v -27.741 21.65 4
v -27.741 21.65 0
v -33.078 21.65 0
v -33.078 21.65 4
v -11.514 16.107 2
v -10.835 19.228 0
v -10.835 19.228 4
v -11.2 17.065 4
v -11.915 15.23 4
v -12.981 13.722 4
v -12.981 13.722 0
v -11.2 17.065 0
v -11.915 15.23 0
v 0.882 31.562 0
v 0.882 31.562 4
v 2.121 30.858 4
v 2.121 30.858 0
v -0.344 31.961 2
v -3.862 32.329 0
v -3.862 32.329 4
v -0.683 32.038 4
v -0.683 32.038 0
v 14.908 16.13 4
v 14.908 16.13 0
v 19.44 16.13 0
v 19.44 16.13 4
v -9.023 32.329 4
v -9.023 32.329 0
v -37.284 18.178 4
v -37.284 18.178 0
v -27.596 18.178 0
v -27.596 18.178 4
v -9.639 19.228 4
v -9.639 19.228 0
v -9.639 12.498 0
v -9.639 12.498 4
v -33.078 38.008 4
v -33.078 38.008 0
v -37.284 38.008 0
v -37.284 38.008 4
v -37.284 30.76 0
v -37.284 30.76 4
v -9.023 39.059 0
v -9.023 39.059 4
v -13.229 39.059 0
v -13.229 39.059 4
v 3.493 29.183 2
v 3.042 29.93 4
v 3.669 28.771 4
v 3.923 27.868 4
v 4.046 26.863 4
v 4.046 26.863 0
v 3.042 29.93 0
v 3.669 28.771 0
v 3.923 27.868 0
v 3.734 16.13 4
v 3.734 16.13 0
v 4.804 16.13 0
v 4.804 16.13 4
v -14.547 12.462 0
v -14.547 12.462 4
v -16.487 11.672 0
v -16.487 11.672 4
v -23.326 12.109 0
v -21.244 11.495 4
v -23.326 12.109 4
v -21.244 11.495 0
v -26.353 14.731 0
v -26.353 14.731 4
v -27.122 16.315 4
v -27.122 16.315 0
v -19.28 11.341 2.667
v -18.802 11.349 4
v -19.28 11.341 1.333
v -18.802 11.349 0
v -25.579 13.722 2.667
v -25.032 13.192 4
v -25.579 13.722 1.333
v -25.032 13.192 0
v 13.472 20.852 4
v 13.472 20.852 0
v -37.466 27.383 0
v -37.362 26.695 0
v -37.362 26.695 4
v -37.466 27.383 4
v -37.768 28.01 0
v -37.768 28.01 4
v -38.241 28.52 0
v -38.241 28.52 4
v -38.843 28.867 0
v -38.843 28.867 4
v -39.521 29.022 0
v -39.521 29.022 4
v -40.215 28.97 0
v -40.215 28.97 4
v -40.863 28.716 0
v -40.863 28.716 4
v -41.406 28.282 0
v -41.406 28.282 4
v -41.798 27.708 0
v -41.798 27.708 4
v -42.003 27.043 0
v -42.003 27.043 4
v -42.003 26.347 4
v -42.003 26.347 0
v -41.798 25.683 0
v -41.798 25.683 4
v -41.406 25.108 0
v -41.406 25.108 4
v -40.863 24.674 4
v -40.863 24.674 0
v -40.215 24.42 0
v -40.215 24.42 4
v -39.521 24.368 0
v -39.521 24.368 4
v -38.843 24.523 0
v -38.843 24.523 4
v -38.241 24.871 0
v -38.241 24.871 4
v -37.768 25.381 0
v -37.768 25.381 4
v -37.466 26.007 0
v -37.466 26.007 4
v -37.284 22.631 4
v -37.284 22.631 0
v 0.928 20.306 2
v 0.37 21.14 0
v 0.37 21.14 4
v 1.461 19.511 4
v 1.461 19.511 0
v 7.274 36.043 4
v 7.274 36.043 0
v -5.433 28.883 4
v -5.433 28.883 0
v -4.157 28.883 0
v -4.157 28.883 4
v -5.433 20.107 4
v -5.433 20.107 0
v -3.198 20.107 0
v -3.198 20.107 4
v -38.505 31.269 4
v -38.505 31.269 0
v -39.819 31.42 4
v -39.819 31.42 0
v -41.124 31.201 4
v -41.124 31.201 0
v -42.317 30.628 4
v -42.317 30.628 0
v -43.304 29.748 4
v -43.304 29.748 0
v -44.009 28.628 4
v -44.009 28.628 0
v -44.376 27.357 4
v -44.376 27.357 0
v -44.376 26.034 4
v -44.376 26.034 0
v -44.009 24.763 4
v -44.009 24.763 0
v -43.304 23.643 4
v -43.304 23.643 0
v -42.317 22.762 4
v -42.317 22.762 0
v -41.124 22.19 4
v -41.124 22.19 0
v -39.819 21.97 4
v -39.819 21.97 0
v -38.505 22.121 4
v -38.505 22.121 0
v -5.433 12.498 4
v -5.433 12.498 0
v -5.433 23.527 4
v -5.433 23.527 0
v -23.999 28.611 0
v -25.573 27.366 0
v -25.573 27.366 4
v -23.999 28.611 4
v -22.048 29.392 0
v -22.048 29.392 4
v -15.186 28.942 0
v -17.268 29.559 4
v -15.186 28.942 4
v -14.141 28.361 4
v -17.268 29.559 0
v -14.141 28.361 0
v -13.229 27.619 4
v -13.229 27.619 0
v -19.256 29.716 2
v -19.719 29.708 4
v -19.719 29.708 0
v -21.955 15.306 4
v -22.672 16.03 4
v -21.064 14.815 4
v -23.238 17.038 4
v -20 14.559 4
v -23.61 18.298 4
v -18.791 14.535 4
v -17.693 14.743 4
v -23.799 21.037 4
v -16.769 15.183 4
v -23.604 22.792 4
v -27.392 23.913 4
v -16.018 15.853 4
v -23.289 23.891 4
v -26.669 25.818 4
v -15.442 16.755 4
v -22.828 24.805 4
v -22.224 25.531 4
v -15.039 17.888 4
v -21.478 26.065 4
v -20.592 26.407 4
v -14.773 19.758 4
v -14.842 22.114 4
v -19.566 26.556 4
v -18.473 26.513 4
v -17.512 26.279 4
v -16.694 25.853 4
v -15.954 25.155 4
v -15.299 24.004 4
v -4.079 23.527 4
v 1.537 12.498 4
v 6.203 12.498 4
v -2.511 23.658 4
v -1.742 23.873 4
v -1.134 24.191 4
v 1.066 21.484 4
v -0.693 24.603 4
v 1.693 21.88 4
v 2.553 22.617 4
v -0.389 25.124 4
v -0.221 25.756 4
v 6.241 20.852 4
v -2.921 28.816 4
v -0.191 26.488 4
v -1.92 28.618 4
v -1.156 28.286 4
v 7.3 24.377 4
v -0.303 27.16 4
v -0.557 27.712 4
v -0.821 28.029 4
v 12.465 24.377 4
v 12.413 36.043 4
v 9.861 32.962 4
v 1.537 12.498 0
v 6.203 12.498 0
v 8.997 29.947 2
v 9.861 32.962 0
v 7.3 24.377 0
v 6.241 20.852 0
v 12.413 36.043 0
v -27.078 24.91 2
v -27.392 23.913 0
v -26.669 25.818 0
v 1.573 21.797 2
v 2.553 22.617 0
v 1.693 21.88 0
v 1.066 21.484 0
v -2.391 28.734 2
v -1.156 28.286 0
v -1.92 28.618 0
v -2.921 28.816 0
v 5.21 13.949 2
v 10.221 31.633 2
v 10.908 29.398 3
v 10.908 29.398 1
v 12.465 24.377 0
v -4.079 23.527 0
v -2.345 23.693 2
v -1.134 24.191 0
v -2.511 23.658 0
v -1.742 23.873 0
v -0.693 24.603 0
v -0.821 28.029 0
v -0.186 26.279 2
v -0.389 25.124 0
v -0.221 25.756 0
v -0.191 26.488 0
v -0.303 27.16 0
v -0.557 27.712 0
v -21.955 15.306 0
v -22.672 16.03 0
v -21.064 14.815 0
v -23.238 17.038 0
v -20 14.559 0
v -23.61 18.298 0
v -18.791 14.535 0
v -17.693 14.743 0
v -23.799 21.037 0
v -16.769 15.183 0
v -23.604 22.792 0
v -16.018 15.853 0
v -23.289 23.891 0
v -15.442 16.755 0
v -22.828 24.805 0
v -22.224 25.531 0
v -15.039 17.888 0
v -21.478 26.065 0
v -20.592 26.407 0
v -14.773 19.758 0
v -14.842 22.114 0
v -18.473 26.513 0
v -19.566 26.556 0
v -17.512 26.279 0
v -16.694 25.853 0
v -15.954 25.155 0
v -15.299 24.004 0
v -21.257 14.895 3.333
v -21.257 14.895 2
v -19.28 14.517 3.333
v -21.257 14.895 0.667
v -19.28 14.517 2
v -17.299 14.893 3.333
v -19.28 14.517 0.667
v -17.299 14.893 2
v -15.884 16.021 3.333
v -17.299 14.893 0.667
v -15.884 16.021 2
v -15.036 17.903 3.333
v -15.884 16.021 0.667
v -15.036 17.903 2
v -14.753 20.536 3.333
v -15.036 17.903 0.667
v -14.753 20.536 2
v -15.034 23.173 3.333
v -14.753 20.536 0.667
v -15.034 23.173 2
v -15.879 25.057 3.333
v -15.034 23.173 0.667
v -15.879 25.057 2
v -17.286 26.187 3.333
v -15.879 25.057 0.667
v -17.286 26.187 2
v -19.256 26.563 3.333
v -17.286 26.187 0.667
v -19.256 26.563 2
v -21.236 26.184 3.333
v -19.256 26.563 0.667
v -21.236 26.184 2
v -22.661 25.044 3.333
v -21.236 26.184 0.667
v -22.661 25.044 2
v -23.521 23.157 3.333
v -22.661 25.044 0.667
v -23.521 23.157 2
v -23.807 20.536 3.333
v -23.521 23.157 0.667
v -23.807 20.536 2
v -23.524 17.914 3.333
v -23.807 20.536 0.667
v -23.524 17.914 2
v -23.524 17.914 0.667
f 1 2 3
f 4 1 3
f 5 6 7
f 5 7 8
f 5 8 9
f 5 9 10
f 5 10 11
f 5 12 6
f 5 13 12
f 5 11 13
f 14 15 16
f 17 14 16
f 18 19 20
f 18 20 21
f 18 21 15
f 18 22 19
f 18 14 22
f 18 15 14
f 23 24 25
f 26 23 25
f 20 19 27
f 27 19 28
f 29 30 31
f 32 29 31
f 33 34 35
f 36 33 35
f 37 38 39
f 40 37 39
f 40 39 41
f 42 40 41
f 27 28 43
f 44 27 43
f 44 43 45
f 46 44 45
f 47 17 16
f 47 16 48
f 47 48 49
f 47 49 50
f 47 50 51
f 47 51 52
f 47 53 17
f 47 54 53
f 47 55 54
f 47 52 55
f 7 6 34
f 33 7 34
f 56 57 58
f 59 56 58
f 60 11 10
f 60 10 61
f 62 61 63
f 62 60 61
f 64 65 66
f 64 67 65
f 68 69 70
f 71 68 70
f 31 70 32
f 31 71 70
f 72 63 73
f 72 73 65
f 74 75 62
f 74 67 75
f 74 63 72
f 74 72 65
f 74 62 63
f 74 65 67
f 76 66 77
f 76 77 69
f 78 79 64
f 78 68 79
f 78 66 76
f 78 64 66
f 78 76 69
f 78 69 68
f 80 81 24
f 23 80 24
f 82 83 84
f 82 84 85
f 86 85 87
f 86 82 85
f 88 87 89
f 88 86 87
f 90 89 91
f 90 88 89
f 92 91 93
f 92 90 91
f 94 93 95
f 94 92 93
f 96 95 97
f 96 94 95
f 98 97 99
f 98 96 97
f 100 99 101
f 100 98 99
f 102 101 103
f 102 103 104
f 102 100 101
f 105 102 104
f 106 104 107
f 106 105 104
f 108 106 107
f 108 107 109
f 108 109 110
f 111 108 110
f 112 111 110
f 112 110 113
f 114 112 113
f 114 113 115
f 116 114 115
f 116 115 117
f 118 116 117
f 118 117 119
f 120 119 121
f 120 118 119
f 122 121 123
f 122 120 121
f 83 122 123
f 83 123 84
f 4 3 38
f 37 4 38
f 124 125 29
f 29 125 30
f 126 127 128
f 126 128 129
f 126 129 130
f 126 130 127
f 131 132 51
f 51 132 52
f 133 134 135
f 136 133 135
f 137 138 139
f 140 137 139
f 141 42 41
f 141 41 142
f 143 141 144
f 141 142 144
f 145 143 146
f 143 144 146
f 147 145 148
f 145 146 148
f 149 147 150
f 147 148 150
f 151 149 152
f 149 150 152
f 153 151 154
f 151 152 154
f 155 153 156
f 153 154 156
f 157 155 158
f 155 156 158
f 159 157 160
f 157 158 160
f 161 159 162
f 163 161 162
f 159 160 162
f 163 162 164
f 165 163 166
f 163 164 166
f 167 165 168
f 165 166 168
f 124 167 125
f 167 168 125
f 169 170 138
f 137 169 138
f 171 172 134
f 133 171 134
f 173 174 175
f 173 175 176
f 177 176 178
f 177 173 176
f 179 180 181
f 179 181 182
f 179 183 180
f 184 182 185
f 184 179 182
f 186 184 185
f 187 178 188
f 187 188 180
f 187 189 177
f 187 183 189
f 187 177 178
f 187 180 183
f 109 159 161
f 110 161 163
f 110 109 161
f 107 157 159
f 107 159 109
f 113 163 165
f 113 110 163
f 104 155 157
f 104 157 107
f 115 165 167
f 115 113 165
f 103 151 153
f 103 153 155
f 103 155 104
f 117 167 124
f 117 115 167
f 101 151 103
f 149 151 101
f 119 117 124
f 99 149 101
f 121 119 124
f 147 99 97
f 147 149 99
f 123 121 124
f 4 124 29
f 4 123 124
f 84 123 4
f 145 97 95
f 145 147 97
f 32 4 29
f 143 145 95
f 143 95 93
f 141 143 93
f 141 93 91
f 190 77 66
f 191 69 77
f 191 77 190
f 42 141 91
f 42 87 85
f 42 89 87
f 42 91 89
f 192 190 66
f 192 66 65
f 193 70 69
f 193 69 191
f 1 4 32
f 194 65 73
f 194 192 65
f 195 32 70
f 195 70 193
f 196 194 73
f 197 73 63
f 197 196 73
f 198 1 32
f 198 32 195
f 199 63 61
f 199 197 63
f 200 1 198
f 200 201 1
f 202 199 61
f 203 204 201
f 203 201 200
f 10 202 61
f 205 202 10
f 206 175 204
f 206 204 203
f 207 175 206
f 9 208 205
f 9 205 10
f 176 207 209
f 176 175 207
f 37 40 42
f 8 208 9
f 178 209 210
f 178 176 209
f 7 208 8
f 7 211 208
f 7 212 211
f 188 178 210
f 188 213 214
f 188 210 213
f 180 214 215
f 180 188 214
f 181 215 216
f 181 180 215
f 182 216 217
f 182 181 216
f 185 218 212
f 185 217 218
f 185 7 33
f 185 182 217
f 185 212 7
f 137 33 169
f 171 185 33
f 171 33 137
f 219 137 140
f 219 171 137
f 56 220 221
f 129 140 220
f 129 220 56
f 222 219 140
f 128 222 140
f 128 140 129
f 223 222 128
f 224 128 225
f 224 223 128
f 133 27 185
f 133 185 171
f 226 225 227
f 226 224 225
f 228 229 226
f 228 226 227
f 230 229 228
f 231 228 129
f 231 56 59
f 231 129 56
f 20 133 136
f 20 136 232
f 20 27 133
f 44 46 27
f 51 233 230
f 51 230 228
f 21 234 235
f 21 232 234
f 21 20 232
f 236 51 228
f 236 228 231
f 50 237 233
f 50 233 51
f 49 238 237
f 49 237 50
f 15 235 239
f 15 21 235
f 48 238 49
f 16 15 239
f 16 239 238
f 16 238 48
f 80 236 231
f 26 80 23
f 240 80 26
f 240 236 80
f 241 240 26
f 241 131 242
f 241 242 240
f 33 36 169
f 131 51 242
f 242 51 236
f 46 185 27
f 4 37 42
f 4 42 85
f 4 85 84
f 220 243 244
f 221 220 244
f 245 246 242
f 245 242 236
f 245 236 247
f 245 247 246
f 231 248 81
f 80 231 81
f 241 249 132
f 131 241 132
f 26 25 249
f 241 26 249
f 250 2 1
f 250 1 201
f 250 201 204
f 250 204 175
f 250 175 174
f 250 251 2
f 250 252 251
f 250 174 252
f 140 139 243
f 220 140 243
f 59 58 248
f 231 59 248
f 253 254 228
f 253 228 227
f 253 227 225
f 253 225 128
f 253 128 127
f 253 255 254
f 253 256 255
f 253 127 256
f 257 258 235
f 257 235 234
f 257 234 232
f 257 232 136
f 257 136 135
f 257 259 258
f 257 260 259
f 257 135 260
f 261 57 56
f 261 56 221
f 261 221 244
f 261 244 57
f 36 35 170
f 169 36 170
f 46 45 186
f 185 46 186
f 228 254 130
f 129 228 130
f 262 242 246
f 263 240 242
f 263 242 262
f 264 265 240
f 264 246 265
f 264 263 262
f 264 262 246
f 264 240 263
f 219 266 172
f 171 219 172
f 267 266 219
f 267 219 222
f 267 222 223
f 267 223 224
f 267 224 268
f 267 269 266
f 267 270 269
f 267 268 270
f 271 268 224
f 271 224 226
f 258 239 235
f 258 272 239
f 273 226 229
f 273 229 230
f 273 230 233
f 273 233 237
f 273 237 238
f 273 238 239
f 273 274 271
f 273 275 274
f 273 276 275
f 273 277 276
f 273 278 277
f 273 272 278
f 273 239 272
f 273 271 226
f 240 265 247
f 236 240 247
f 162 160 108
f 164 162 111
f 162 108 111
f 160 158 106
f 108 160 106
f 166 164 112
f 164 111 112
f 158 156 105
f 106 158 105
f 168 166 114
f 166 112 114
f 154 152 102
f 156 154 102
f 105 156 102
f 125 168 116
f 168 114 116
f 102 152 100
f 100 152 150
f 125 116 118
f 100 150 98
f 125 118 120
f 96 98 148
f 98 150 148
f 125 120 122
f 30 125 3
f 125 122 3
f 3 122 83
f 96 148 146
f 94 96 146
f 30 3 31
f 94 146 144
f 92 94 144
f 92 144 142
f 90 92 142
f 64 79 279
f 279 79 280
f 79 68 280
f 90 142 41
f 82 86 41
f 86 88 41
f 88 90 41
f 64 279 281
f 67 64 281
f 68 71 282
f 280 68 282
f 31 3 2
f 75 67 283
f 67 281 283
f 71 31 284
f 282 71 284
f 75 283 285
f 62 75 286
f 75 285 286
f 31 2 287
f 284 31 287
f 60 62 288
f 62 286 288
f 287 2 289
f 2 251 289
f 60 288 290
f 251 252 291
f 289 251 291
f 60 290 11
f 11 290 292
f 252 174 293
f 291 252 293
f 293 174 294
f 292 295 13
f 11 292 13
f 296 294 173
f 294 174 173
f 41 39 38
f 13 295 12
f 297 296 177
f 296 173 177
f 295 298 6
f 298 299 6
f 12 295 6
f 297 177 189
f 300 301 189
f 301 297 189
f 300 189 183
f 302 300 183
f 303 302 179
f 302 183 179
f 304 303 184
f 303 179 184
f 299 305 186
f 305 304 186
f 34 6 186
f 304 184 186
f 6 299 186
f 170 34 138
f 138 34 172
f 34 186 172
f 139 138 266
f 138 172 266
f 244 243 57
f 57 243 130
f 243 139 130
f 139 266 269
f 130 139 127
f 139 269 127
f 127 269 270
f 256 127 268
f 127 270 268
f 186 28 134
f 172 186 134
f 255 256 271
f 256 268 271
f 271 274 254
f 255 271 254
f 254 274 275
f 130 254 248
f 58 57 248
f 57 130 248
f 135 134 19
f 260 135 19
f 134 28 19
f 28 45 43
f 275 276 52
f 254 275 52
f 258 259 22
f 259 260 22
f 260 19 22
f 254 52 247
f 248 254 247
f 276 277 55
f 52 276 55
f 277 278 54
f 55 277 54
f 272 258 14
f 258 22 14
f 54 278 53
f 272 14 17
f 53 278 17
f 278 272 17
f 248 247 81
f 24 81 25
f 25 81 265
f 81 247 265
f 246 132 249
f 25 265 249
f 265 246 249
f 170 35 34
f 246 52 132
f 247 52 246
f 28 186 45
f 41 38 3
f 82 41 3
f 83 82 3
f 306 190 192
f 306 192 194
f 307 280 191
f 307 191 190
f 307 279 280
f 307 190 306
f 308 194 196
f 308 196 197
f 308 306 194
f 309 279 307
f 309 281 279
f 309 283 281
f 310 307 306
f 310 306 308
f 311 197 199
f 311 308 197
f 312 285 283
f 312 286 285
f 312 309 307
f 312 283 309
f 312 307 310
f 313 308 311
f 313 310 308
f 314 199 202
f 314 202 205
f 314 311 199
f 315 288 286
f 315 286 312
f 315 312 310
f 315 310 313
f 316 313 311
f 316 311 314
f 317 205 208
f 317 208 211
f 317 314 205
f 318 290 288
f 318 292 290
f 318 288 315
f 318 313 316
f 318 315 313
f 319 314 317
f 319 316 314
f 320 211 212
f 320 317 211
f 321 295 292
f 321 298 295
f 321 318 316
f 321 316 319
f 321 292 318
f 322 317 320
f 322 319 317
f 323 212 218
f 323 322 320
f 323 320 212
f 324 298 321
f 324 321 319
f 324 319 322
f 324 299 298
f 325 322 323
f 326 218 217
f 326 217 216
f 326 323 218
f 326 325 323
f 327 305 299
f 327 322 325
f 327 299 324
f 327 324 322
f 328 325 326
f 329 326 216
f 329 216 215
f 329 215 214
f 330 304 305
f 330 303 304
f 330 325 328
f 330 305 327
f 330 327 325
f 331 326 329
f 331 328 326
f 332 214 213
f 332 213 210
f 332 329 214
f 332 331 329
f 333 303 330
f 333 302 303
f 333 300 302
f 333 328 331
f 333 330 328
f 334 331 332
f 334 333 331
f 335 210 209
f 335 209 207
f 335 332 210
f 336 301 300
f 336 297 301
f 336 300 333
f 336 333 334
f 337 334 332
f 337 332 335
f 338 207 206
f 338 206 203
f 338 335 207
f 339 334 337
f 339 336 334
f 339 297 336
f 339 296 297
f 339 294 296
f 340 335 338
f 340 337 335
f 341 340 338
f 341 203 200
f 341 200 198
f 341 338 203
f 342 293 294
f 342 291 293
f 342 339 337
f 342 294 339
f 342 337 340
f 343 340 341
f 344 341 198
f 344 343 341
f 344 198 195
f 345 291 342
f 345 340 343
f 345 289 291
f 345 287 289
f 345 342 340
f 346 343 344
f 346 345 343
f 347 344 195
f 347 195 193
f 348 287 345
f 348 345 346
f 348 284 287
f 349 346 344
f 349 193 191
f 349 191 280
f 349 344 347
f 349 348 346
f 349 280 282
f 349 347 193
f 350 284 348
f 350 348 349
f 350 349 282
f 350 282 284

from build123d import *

# Parameters (mm, degrees)
F0_W     = 0.6158737143
F0_H     = 13.1007836608
F1_DEPTH = 4
F2_R     = 4.7264248865
F2_R_2   = 2.3334796288
F3_DEPTH = 4


with BuildPart() as f1:
    # F0 (on Top) → F1 (new body)
    with BuildSketch(Plane.XY):
        with BuildLine():
            Line((-37.283715081, 38.0084128603), (-37.283715081, 18.1776836936))
            Line((-37.283715081, 18.1776836936), (-27.5958860841, 18.1776836936))
            add(Edge.make_bspline(
                [(-27.5958860841, 18.1776836936), (-27.7759831045, 19.2835325513), (-27.7759831045, 20.5595530824)],
                knots=[0.7137061736, 0.7137061736, 0.7137061736, 1, 1, 1], degree=2))
            add(Edge.make_bspline(
                [(-27.7759831045, 20.5595530824), (-27.7759831045, 21.1214784417), (-27.7409639994, 21.6499059158)],
                knots=[0, 0, 0, 0.1260761542, 0.1260761542, 0.1260761542], degree=2))
            Line((-27.7409639994, 21.6499059158), (-33.0779859144, 21.6499059158))
            Line((-33.0779859144, 21.6499059158), (-33.0779859144, 38.0084128603))
            Line((-33.0779859144, 38.0084128603), (-37.283715081, 38.0084128603))
        make_face()
        with BuildLine():
            add(Edge.make_bspline(
                [(-27.5958860841, 18.1776836936), (-27.7759831045, 19.2835325513), (-27.7759831045, 20.5595530824)],
                knots=[0.7137061736, 0.7137061736, 0.7137061736, 1, 1, 1], degree=2))
            Line((-27.5958860841, 18.1776836936), (-25.0354511921, 18.1776836936))
            Line((-25.0354511921, 18.1776836936), (-25.0354511921, 21.6499059158))
            Line((-25.0354511921, 21.6499059158), (-27.7409639994, 21.6499059158))
            add(Edge.make_bspline(
                [(-27.7759831045, 20.5595530824), (-27.7759831045, 21.1214784417), (-27.7409639994, 21.6499059158)],
                knots=[0, 0, 0, 0.1260761542, 0.1260761542, 0.1260761542], degree=2))
        make_face()
        with BuildLine():
            Line((-25.0354511921, 18.1776836936), (-27.5958860841, 18.1776836936))
            add(Edge.make_bspline(
                [(-25.5787174795, 13.7216624574), (-27.146919521, 15.4208964917), (-27.5958860841, 18.1776836936)],
                knots=[0, 0, 0, 0.7137061736, 0.7137061736, 0.7137061736], degree=2))
            add(Edge.make_bspline(
                [(-19.2798893545, 11.3408030824), (-23.3814518545, 11.3408030824), (-25.5787174795, 13.7216624574)],
                knots=[0, 0, 0, 1, 1, 1], degree=2))
            add(Edge.make_bspline(
                [(-12.9810612295, 13.7216624574), (-15.1783268545, 11.3408030824), (-19.2798893545, 11.3408030824)],
                knots=[0, 0, 0, 1, 1, 1], degree=2))
            add(Edge.make_bspline(
                [(-10.8351730856, 19.228203094), (-11.1197866358, 15.7384568838), (-12.9810612295, 13.7216624574)],
                knots=[0.1529132516, 0.1529132516, 0.1529132516, 1, 1, 1], degree=2))
            Line((-10.8351730856, 19.228203094), (-13.228776075, 19.228203094))
            Line((-13.228776075, 19.228203094), (-13.228776075, 27.6192945451))
            add(Edge.make_bspline(
                [(-19.2564518545, 29.7158030824), (-15.3870725584, 29.7158030824), (-13.228776075, 27.6192945451)],
                knots=[0, 0, 0, 0.9407037985, 0.9407037985, 0.9407037985], degree=2))
            add(Edge.make_bspline(
                [(-25.5728581045, 27.3661937074), (-23.3697331045, 29.7158030824), (-19.2564518545, 29.7158030824)],
                knots=[0, 0, 0, 1, 1, 1], degree=2))
            add(Edge.make_bspline(
                [(-27.7409639994, 21.6499059158), (-27.4982215772, 25.3128140464), (-25.5728581045, 27.3661937074)],
                knots=[0.1260761542, 0.1260761542, 0.1260761542, 1, 1, 1], degree=2))
            Line((-27.7409639994, 21.6499059158), (-25.0354511921, 21.6499059158))
            Line((-25.0354511921, 21.6499059158), (-25.0354511921, 18.1776836936))
        make_face()
        with BuildLine():
            add(Edge.make_bspline(
                [(-23.8072331045, 20.5361155824), (-23.8072331045, 17.5439280824), (-22.6724674795, 16.0302562074)],
                knots=[0, 0, 0, 1, 1, 1], degree=2))
            add(Edge.make_bspline(
                [(-22.6607487295, 25.0439280824), (-23.8072331045, 23.5243968324), (-23.8072331045, 20.5361155824)],
                knots=[0, 0, 0, 1, 1, 1], degree=2))
            add(Edge.make_bspline(
                [(-19.2564518545, 26.5634593324), (-21.5142643545, 26.5634593324), (-22.6607487295, 25.0439280824)],
                knots=[0, 0, 0, 1, 1, 1], degree=2))
            add(Edge.make_bspline(
                [(-14.7525456045, 20.5361155824), (-14.7525456045, 26.5634593324), (-19.2564518545, 26.5634593324)],
                knots=[0, 0, 0, 1, 1, 1], degree=2))
            add(Edge.make_bspline(
                [(-19.2798893545, 14.5165843324), (-14.7525456045, 14.5165843324), (-14.7525456045, 20.5361155824)],
                knots=[0, 0, 0, 1, 1, 1], degree=2))
            add(Edge.make_bspline(
                [(-22.6724674795, 16.0302562074), (-21.5377018545, 14.5165843324), (-19.2798893545, 14.5165843324)],
                knots=[0, 0, 0, 1, 1, 1], degree=2))
        make_face(mode=Mode.SUBTRACT)
        with BuildLine():
            Line((-13.228776075, 19.228203094), (-10.8351730856, 19.228203094))
            add(Edge.make_bspline(
                [(-10.7837956045, 20.5361155824), (-10.7837956045, 19.8581603459), (-10.8351730856, 19.228203094)],
                knots=[0, 0, 0, 0.1529132516, 0.1529132516, 0.1529132516], degree=2))
            add(Edge.make_bspline(
                [(-12.9634831045, 27.3466624574), (-10.7837956045, 24.9775218324), (-10.7837956045, 20.5361155824)],
                knots=[0, 0, 0, 1, 1, 1], degree=2))
            add(Edge.make_bspline(
                [(-13.228776075, 27.6192945451), (-13.0927302937, 27.4871434973), (-12.9634831045, 27.3466624574)],
                knots=[0.9407037985, 0.9407037985, 0.9407037985, 1, 1, 1], degree=2))
            Line((-13.228776075, 27.6192945451), (-13.228776075, 19.228203094))
        make_face()
        with BuildLine():
            add(Edge.make_bspline(
                [(-10.7837956045, 20.5361155824), (-10.7837956045, 19.8581603459), (-10.8351730856, 19.228203094)],
                knots=[0, 0, 0, 0.1529132516, 0.1529132516, 0.1529132516], degree=2))
            Line((-10.8351730856, 19.228203094), (-9.6389206226, 19.228203094))
            Line((-9.6389206226, 19.228203094), (-9.6389206226, 32.3289867548))
            Line((-9.6389206226, 32.3289867548), (-9.0230469083, 32.3289867548))
            Line((-9.0230469083, 32.3289867548), (-9.0230469083, 39.0589322607))
            Line((-9.0230469083, 39.0589322607), (-13.228776075, 39.0589322607))
            Line((-13.228776075, 39.0589322607), (-13.228776075, 27.6192945451))
            add(Edge.make_bspline(
                [(-13.228776075, 27.6192945451), (-13.0927302937, 27.4871434973), (-12.9634831045, 27.3466624574)],
                knots=[0.9407037985, 0.9407037985, 0.9407037985, 1, 1, 1], degree=2))
            add(Edge.make_bspline(
                [(-12.9634831045, 27.3466624574), (-10.7837956045, 24.9775218324), (-10.7837956045, 20.5361155824)],
                knots=[0, 0, 0, 1, 1, 1], degree=2))
        make_face()
        with Locations((-9.3309837654, 25.7785949244)):
            Rectangle(F0_W, F0_H)
        with BuildLine():
            Line((-9.0230469083, 19.228203094), (-9.6389206226, 19.228203094))
            Line((-9.6389206226, 19.228203094), (-9.6389206226, 12.4982575881))
            Line((-9.6389206226, 12.4982575881), (-5.4331914559, 12.4982575881))
            Line((-5.4331914559, 12.4982575881), (-5.4331914559, 20.1067645326))
            Line((-5.4331914559, 20.1067645326), (-3.1979484003, 20.1067645326))
            Line((-3.1979484003, 20.1067645326), (1.5372946552, 12.4982575881))
            Line((1.5372946552, 12.4982575881), (6.2030932663, 12.4982575881))
            add(Edge.make_bspline(
                [(3.7338970639, 16.1299808387), (5.4507652179, 13.5833461195), (6.2030932663, 12.4982575881)],
                knots=[0.4444346719, 0.4444346719, 0.4444346719, 1, 1, 1], degree=2))
            Line((3.7338970639, 16.1299808387), (0.2728733631, 16.1299808387))
            Line((0.2728733631, 16.1299808387), (1.4614468222, 19.5107465115))
            add(Edge.make_bspline(
                [(0.369759933, 21.1397506437), (0.9410184247, 20.2867377215), (1.4614468222, 19.5107465115)],
                knots=[0, 0, 0, 0.1275367795, 0.1275367795, 0.1275367795], degree=2))
            add(Edge.make_bspline(
                [(2.5534989348, 22.6169678955), (1.6846822939, 21.7148272536), (0.369759933, 21.1397506437)],
                knots=[0.2556311745, 0.2556311745, 0.2556311745, 1, 1, 1], degree=2))
            Line((2.5534989348, 22.6169678955), (4.0462793726, 26.8630166548))
            add(Edge.make_bspline(
                [(2.1210620163, 30.8576325881), (3.902011744, 29.5054669494), (4.0462793726, 26.8630166548)],
                knots=[0, 0, 0, 0.9189939916, 0.9189939916, 0.9189939916], degree=2))
            add(Edge.make_bspline(
                [(-3.8620109003, 32.3289867548), (0.1831279885, 32.3289867548), (2.1210620163, 30.8576325881)],
                knots=[0, 0, 0, 1, 1, 1], degree=2))
            Line((-3.8620109003, 32.3289867548), (-9.0230469083, 32.3289867548))
            Line((-9.0230469083, 32.3289867548), (-9.0230469083, 19.228203094))
        make_face()
        with BuildLine():
            Line((-4.0790247892, 23.5269034215), (-5.4331914559, 23.5269034215))
            Line((-5.4331914559, 23.5269034215), (-5.4331914559, 28.8828061992))
            Line((-5.4331914559, 28.8828061992), (-4.1571497892, 28.8828061992))
            add(Edge.make_bspline(
                [(-1.1558477059, 28.2860180048), (-2.1258997892, 28.8828061992), (-4.1571497892, 28.8828061992)],
                knots=[0, 0, 0, 1, 1, 1], degree=2))
            add(Edge.make_bspline(
                [(-0.1857956226, 26.2786395326), (-0.1857956226, 27.6892298103), (-1.1558477059, 28.2860180048)],
                knots=[0, 0, 0, 1, 1, 1], degree=2))
            add(Edge.make_bspline(
                [(-1.134146317, 24.1909659215), (-0.1857956226, 24.8550284215), (-0.1857956226, 26.2786395326)],
                knots=[0, 0, 0, 1, 1, 1], degree=2))
            add(Edge.make_bspline(
                [(-4.0790247892, 23.5269034215), (-2.0824970115, 23.5269034215), (-1.134146317, 24.1909659215)],
                knots=[0, 0, 0, 1, 1, 1], degree=2))
        make_face(mode=Mode.SUBTRACT)
        with BuildLine():
            Line((7.2737414187, 36.0431752831), (4.0462793726, 26.8630166548))
            add(Edge.make_bspline(
                [(4.0462793726, 26.8630166548), (4.0589960441, 26.6300941845), (4.0589960441, 26.387146477)],
                knots=[0.9189939916, 0.9189939916, 0.9189939916, 1, 1, 1], degree=2))
            add(Edge.make_bspline(
                [(4.0589960441, 26.387146477), (4.0589960441, 24.6380145326), (3.0976245163, 23.2751673103)],
                knots=[0, 0, 0, 1, 1, 1], degree=2))
            add(Edge.make_bspline(
                [(3.0976245163, 23.2751673103), (2.8518679835, 22.9267810742), (2.5534989348, 22.6169678955)],
                knots=[0, 0, 0, 0.2556311745, 0.2556311745, 0.2556311745], degree=2))
            Line((2.5534989348, 22.6169678955), (1.4614468222, 19.5107465115))
            add(Edge.make_bspline(
                [(1.4614468222, 19.5107465115), (2.7545848714, 17.5825970016), (3.7338970639, 16.1299808387)],
                knots=[0.1275367795, 0.1275367795, 0.1275367795, 0.4444346719, 0.4444346719, 0.4444346719], degree=2))
            Line((3.7338970639, 16.1299808387), (4.8041233631, 16.1299808387))
            Line((4.8041233631, 16.1299808387), (6.2407553076, 20.8522030609))
            Line((6.2407553076, 20.8522030609), (13.4716580853, 20.8522030609))
            Line((13.4716580853, 20.8522030609), (14.9082900298, 16.1299808387))
            Line((14.9082900298, 16.1299808387), (19.4395400298, 16.1299808387))
            Line((19.4395400298, 16.1299808387), (12.4126303076, 36.0431752831))
            Line((12.4126303076, 36.0431752831), (7.2737414187, 36.0431752831))
        make_face()
        with BuildLine():
            add(Edge.make_bspline(
                [(12.4647136409, 24.3765086165), (10.4725261409, 30.791439172), (10.2207900298, 31.6334530609)],
                knots=[0, 0, 0, 1, 1, 1], degree=2))
            Line((12.4647136409, 24.3765086165), (7.2997830853, 24.3765086165))
            add(Edge.make_bspline(
                [(9.8605469742, 32.9615780609), (9.4134983631, 31.2254669498), (7.2997830853, 24.3765086165)],
                knots=[0, 0, 0, 1, 1, 1], degree=2))
            add(Edge.make_bspline(
                [(10.2207900298, 31.6334530609), (9.9690539187, 32.4754669498), (9.8605469742, 32.9615780609)],
                knots=[0, 0, 0, 1, 1, 1], degree=2))
        make_face(mode=Mode.SUBTRACT)
        with BuildLine():
            add(Edge.make_bspline(
                [(4.0462793726, 26.8630166548), (4.0589960441, 26.6300941845), (4.0589960441, 26.387146477)],
                knots=[0.9189939916, 0.9189939916, 0.9189939916, 1, 1, 1], degree=2))
            Line((4.0462793726, 26.8630166548), (2.5534989348, 22.6169678955))
            add(Edge.make_bspline(
                [(3.0976245163, 23.2751673103), (2.8518679835, 22.9267810742), (2.5534989348, 22.6169678955)],
                knots=[0, 0, 0, 0.2556311745, 0.2556311745, 0.2556311745], degree=2))
            add(Edge.make_bspline(
                [(4.0589960441, 26.387146477), (4.0589960441, 24.6380145326), (3.0976245163, 23.2751673103)],
                knots=[0, 0, 0, 1, 1, 1], degree=2))
        make_face()
        with BuildLine():
            add(Edge.make_bspline(
                [(1.4614468222, 19.5107465115), (2.7545848714, 17.5825970016), (3.7338970639, 16.1299808387)],
                knots=[0.1275367795, 0.1275367795, 0.1275367795, 0.4444346719, 0.4444346719, 0.4444346719], degree=2))
            Line((1.4614468222, 19.5107465115), (0.2728733631, 16.1299808387))
            Line((0.2728733631, 16.1299808387), (3.7338970639, 16.1299808387))
        make_face()
    extrude(amount=F1_DEPTH)

    # F2 (on Top) → F3 (join)
    with BuildSketch(Plane.XY):
        with Locations((-39.6957695484, 26.6952458769)):
            Circle(F2_R)
        with Locations((-39.6957695484, 26.6952458769)):
            Circle(F2_R_2, mode=Mode.SUBTRACT)
    extrude(amount=F3_DEPTH)


solid = f1.part
